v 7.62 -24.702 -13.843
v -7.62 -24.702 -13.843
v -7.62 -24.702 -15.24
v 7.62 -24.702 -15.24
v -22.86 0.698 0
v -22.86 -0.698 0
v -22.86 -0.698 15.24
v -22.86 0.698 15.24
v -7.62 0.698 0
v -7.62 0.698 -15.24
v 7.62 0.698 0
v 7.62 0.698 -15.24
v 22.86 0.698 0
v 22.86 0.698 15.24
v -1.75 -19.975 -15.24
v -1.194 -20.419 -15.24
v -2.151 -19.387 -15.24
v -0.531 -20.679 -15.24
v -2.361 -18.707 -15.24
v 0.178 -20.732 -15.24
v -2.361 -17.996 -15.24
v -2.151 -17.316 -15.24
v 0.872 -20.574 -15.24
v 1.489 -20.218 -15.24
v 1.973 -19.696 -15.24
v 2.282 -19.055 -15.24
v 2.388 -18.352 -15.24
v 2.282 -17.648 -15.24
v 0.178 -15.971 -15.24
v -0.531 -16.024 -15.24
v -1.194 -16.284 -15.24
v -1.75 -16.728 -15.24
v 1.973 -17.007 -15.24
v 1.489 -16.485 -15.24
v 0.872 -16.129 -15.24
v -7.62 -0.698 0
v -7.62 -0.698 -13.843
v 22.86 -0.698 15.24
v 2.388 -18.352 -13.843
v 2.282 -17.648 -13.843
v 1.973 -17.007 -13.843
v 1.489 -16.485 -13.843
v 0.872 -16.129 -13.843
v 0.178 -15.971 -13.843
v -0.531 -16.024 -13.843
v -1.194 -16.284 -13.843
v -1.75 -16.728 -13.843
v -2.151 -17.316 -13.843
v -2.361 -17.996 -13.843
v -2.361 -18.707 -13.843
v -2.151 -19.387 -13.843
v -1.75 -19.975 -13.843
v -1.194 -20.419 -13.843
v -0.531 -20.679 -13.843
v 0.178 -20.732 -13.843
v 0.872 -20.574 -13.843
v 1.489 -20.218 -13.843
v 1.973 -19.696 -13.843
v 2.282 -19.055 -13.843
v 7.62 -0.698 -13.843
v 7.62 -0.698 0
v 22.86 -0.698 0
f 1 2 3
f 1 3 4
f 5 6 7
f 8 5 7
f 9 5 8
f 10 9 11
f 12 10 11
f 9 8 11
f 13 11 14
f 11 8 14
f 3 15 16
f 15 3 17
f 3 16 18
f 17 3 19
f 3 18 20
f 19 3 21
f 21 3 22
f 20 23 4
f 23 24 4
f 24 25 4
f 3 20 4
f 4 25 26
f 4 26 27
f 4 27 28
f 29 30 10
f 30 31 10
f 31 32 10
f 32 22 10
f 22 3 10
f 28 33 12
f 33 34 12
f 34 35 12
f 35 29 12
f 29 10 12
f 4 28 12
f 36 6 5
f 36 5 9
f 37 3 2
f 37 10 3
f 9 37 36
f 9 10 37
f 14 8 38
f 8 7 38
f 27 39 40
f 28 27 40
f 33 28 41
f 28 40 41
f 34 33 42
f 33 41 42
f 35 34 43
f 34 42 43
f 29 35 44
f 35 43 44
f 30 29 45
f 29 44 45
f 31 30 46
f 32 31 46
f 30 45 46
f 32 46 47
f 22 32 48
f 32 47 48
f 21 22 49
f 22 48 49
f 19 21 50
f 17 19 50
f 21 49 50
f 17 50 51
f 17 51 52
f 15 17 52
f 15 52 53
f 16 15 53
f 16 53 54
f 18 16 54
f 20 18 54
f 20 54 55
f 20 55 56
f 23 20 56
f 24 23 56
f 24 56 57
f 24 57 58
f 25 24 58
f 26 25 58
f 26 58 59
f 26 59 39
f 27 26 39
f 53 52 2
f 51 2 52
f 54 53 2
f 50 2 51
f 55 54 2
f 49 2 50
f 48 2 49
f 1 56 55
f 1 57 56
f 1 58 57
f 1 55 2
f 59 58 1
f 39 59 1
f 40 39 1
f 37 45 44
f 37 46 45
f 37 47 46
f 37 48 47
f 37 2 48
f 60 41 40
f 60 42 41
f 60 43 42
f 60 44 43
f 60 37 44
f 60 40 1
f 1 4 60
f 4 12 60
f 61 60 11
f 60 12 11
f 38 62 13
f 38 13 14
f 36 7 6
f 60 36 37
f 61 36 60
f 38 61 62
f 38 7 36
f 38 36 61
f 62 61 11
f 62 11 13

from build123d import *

# Parameters (mm, degrees)
F0_W     = 45.72
F0_H     = 30.48
F1_DEPTH = 0.6985
F2_W     = 15.24
F2_H     = 15.24
F3_DEPTH = 1.398
F4_W     = 15.24
F4_H     = 1.397
F5_DEPTH = 24.003
F6_R     = 2.3876
F7_DEPTH = 1.398


with BuildPart() as f1:
    # F0 (on Front) → F1 (new body, symmetric)
    with BuildSketch(Plane.XZ):
        Rectangle(F0_W, F0_H)
    extrude(amount=F1_DEPTH, both=True)

    # F2 (on face) → F3 (cut, through all)
    with BuildSketch(Plane.XZ.offset(0.6985)):
        with Locations((-15.24, -7.62)):
            Rectangle(F2_W, F2_H)
        with Locations((15.24, -7.62)):
            Rectangle(F2_W, F2_H)
    extrude(amount=-F3_DEPTH, mode=Mode.SUBTRACT)

    # F4 (on face) → F5 (join)
    with BuildSketch(Plane.XZ.offset(0.6985)):
        with Locations((0, -14.5415)):
            Rectangle(F4_W, F4_H)
    extrude(amount=F5_DEPTH)

    # F6 (on face) → F7 (cut, through all)
    with BuildSketch(Plane.XY.offset(-13.843)):
        with Locations((0, -18.3515)):
            Circle(F6_R)
    extrude(amount=-F7_DEPTH, mode=Mode.SUBTRACT)


solid = f1.part
